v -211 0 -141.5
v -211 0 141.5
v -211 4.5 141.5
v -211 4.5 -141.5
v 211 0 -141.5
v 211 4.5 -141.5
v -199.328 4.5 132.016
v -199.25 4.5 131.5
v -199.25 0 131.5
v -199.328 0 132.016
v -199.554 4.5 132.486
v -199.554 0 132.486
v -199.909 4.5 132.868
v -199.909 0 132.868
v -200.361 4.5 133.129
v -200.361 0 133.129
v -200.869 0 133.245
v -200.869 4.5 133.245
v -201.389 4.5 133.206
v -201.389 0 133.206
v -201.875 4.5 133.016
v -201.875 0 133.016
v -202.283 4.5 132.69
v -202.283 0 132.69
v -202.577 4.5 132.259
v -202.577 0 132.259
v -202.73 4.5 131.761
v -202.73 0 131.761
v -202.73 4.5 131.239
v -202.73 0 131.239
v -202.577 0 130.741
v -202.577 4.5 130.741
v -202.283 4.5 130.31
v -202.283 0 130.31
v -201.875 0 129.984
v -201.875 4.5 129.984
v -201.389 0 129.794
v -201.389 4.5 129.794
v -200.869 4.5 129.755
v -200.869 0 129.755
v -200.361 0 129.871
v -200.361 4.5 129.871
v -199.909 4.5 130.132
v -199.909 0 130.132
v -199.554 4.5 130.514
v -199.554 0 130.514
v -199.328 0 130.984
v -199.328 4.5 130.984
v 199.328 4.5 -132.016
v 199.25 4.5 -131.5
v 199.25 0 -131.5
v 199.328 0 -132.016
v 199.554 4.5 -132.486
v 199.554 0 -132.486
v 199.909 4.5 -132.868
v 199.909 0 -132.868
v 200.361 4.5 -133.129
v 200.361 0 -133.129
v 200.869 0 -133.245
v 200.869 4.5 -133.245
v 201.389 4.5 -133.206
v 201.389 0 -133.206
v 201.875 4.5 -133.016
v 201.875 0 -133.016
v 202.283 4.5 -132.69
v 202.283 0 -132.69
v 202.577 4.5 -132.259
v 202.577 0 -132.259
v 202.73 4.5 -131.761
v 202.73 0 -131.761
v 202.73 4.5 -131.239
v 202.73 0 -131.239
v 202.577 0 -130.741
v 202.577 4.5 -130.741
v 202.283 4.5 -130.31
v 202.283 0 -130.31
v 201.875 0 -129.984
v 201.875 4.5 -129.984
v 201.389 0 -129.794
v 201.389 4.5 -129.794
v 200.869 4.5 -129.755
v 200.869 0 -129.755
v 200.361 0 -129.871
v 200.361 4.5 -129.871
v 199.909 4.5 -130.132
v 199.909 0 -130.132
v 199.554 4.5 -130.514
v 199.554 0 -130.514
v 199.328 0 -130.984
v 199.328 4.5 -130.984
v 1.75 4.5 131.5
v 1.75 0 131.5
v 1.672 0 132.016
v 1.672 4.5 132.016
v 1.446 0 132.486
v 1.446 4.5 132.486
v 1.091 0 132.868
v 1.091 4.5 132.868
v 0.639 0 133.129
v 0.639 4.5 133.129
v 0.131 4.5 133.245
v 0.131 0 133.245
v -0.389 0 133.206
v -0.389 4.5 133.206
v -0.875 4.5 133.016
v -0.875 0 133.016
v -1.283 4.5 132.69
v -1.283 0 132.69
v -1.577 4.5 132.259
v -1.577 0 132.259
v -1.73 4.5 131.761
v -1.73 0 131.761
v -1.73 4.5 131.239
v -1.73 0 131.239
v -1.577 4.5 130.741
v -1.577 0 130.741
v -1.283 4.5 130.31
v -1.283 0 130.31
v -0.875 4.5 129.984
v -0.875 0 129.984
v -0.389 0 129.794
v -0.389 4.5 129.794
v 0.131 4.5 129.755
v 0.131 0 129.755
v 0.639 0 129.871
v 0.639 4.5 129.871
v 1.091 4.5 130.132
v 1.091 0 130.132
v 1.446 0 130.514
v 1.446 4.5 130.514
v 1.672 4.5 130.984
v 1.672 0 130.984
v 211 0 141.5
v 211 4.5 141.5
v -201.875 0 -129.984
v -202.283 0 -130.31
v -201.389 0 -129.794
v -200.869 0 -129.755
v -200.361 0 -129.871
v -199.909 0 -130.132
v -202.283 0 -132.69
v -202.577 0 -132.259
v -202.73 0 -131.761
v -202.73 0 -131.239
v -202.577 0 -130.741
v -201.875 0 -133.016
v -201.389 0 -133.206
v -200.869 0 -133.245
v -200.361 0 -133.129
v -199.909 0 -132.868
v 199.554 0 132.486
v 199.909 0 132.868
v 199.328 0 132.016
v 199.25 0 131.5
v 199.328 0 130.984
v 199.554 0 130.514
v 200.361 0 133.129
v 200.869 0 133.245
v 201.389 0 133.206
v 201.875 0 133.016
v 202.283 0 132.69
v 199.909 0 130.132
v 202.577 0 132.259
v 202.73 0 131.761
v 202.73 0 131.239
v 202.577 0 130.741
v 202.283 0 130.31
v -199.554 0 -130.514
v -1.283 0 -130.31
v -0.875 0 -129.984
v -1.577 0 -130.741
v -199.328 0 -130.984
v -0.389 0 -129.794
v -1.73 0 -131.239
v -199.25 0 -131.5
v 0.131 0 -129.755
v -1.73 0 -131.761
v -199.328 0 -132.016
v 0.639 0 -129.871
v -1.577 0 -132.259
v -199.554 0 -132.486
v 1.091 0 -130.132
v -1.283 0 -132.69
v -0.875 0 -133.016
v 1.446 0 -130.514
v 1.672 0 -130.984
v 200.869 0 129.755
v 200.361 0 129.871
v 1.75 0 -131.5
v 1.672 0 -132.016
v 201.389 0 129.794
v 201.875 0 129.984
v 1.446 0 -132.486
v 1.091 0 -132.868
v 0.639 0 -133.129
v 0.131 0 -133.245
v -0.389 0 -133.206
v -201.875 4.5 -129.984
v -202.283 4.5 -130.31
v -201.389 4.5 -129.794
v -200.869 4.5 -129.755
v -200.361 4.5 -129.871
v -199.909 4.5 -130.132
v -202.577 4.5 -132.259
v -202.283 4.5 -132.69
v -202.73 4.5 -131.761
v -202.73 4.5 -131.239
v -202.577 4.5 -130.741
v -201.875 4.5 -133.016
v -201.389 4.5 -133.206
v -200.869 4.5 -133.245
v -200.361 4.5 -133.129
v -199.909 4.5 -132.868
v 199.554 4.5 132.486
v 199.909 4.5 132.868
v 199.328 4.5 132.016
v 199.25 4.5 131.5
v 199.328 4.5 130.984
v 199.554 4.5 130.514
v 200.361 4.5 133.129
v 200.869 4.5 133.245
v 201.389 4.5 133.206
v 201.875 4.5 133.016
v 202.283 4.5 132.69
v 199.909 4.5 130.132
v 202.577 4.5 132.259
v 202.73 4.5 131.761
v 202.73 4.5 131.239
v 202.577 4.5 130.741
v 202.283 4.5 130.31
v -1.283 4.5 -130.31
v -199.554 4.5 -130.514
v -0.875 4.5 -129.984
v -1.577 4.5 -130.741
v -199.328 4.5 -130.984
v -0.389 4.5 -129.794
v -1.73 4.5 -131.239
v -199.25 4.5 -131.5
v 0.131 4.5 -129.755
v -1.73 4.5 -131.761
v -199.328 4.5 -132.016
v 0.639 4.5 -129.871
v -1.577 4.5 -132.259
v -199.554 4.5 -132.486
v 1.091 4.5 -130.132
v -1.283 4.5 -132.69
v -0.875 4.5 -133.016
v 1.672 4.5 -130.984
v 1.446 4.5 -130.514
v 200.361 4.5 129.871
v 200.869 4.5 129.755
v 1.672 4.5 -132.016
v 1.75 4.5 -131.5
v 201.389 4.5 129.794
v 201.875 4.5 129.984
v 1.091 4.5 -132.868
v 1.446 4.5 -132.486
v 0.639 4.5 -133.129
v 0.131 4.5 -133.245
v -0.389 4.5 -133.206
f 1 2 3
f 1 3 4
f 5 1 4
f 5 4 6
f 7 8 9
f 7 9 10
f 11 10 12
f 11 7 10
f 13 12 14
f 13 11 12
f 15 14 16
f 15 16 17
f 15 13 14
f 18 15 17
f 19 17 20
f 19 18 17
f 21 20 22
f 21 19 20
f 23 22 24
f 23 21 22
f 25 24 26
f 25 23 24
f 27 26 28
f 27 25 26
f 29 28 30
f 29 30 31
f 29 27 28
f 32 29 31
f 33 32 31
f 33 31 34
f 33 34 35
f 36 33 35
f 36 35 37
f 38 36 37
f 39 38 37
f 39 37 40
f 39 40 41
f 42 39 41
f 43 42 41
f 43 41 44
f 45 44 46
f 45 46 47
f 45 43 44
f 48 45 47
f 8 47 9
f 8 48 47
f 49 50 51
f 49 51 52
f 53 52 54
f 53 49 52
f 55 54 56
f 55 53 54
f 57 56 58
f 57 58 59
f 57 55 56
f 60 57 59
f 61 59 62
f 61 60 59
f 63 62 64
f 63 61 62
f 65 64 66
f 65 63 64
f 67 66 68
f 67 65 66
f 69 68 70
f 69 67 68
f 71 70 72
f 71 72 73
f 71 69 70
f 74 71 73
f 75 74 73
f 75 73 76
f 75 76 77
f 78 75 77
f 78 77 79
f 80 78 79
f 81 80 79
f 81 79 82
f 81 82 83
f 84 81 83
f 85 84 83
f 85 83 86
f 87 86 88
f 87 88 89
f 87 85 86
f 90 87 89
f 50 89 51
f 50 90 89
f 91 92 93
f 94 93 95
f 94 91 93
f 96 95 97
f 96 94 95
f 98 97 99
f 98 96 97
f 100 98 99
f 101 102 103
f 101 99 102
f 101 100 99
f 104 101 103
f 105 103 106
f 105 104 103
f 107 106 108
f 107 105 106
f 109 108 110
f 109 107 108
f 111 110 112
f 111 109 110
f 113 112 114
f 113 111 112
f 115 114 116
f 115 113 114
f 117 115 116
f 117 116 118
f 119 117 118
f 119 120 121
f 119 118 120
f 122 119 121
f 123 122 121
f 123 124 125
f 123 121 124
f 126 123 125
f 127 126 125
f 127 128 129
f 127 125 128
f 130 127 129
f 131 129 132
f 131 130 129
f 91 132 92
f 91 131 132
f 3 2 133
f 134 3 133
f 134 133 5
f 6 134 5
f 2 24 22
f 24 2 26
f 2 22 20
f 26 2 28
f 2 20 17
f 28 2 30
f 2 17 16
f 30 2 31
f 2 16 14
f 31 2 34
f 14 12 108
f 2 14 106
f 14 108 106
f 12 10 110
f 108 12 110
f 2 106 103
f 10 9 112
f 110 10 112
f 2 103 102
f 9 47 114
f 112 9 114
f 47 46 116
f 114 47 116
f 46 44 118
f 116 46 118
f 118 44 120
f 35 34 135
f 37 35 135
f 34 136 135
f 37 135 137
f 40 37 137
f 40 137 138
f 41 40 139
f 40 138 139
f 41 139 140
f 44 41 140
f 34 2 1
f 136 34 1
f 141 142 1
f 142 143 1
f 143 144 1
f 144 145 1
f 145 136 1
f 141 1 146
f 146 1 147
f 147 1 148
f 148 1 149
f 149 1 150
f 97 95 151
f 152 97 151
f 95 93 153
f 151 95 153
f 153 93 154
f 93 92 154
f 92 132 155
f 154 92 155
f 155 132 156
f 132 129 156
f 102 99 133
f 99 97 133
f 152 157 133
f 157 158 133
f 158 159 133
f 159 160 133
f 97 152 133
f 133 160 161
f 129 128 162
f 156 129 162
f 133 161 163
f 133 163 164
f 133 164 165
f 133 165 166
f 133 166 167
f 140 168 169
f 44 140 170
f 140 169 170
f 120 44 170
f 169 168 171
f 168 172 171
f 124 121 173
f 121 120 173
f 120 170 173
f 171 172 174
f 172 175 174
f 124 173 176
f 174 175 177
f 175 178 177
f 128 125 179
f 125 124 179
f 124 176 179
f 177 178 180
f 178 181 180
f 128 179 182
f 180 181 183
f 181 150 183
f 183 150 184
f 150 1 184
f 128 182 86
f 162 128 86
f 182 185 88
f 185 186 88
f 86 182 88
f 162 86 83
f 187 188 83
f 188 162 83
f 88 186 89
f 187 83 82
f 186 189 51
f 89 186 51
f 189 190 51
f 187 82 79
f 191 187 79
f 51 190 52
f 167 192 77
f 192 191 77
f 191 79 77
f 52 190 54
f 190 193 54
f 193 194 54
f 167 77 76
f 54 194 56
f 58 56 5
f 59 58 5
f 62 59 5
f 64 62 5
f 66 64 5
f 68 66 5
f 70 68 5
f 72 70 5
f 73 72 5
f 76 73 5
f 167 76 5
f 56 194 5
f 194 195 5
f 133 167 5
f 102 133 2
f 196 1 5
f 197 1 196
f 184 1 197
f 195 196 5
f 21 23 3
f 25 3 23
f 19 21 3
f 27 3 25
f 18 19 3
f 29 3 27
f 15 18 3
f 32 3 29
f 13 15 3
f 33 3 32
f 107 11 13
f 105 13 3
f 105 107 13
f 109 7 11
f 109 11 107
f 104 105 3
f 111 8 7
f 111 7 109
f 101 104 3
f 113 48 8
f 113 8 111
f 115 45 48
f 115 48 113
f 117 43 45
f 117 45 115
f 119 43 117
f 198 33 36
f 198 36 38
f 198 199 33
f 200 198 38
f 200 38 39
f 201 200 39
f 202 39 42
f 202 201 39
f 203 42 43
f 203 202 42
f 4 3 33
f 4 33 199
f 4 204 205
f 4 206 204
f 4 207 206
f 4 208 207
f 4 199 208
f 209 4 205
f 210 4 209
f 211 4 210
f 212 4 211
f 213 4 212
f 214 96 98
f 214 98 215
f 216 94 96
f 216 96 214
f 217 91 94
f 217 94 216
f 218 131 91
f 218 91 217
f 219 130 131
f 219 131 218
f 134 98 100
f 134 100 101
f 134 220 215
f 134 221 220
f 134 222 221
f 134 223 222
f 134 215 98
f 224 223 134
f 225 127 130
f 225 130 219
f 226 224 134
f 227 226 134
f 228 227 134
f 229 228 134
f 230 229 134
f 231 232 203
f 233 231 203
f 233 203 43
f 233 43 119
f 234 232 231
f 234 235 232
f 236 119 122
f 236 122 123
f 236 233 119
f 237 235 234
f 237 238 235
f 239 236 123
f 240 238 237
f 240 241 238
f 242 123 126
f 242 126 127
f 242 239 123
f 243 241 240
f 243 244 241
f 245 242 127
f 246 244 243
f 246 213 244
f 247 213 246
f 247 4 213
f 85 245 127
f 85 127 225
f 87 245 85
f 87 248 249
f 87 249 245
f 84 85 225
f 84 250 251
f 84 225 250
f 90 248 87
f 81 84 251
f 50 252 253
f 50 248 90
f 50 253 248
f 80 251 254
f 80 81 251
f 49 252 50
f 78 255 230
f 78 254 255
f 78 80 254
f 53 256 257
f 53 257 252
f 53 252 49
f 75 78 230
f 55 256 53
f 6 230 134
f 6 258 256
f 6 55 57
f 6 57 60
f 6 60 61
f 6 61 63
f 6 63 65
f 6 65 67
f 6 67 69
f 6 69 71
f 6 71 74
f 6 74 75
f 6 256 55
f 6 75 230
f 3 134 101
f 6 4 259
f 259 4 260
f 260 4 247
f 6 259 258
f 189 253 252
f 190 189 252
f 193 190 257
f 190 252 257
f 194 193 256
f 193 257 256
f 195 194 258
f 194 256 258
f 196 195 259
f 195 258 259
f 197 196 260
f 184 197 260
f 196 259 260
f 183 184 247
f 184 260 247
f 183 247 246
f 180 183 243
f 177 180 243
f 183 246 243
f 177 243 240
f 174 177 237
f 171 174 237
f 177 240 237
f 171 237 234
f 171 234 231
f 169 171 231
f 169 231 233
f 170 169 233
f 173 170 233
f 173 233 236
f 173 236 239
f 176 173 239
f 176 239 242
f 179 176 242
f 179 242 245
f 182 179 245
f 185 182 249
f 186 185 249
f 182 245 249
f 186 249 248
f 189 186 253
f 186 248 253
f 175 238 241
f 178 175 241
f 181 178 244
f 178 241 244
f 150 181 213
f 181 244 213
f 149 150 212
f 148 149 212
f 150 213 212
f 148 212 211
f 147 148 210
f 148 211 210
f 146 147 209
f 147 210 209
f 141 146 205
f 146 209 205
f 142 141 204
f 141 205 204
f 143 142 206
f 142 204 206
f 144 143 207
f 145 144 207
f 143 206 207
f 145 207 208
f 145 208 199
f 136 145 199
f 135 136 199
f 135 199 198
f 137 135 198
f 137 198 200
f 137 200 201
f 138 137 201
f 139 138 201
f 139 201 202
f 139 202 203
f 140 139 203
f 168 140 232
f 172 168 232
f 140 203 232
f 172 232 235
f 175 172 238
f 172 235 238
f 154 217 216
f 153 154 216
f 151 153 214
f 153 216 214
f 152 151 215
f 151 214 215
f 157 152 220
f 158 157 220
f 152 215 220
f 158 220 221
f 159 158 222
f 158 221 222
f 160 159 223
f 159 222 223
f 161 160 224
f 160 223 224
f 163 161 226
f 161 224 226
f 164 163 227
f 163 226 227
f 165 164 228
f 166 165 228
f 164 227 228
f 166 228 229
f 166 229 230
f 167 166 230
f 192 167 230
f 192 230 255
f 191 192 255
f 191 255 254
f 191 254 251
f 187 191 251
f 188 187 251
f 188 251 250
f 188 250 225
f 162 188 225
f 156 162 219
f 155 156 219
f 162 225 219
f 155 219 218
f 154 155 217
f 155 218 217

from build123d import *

# Parameters (mm, degrees)
SKETCH1_W               = 422
SKETCH1_H               = 283
BOSS_EXTRUDE1_DEPTH     = 4.5
SKETCH2_R               = 1.75
CUT_EXTRUDE1_DEPTH      = 4.5
MIRROR3_COPY_1_SKETCH_R = 1.75
MIRROR3_COPY_1_DEPTH    = 4.5


with BuildPart() as part:
    # Sketch1 → Boss-Extrude1 (new body)
    with BuildSketch(Plane(origin=(0, 0, 0), x_dir=(1, 0, 0), z_dir=(0, 1, 0))):
        Rectangle(SKETCH1_W, SKETCH1_H)
    extrude(amount=BOSS_EXTRUDE1_DEPTH)

    # Sketch2 → Cut-Extrude1 (cut)
    with BuildSketch(Plane(origin=(0, 4.5, 0), x_dir=(1, 0, 0), z_dir=(0, 1, 0))):
        with Locations((-201, 131.5)):
            Circle(SKETCH2_R)
        with Locations((0, 131.5)):
            Circle(SKETCH2_R)
    cut_extrude1 = extrude(amount=-CUT_EXTRUDE1_DEPTH, mode=Mode.SUBTRACT)

    # Mirror2: Cut-Extrude1 across plane
    add(cut_extrude1.mirror(Plane(origin=(0, 0, 0), x_dir=(0, 0, 1), z_dir=(1, 0, 0))), mode=Mode.SUBTRACT)

    # Mirror3: Cut-Extrude1 across plane
    add(cut_extrude1.mirror(Plane.XY), mode=Mode.SUBTRACT)

    # Mirror3 copy 1 sketch → Mirror3 copy 1 (cut)
    with BuildSketch(Plane(origin=(0, 4.5, 0), x_dir=(-1, 0, 0), z_dir=(0, 1, 0))):
        with Locations((-201, 131.5)):
            Circle(MIRROR3_COPY_1_SKETCH_R)
        with Locations((0, 131.5)):
            Circle(MIRROR3_COPY_1_SKETCH_R)
    extrude(amount=-MIRROR3_COPY_1_DEPTH, mode=Mode.SUBTRACT)


solid = part.part
